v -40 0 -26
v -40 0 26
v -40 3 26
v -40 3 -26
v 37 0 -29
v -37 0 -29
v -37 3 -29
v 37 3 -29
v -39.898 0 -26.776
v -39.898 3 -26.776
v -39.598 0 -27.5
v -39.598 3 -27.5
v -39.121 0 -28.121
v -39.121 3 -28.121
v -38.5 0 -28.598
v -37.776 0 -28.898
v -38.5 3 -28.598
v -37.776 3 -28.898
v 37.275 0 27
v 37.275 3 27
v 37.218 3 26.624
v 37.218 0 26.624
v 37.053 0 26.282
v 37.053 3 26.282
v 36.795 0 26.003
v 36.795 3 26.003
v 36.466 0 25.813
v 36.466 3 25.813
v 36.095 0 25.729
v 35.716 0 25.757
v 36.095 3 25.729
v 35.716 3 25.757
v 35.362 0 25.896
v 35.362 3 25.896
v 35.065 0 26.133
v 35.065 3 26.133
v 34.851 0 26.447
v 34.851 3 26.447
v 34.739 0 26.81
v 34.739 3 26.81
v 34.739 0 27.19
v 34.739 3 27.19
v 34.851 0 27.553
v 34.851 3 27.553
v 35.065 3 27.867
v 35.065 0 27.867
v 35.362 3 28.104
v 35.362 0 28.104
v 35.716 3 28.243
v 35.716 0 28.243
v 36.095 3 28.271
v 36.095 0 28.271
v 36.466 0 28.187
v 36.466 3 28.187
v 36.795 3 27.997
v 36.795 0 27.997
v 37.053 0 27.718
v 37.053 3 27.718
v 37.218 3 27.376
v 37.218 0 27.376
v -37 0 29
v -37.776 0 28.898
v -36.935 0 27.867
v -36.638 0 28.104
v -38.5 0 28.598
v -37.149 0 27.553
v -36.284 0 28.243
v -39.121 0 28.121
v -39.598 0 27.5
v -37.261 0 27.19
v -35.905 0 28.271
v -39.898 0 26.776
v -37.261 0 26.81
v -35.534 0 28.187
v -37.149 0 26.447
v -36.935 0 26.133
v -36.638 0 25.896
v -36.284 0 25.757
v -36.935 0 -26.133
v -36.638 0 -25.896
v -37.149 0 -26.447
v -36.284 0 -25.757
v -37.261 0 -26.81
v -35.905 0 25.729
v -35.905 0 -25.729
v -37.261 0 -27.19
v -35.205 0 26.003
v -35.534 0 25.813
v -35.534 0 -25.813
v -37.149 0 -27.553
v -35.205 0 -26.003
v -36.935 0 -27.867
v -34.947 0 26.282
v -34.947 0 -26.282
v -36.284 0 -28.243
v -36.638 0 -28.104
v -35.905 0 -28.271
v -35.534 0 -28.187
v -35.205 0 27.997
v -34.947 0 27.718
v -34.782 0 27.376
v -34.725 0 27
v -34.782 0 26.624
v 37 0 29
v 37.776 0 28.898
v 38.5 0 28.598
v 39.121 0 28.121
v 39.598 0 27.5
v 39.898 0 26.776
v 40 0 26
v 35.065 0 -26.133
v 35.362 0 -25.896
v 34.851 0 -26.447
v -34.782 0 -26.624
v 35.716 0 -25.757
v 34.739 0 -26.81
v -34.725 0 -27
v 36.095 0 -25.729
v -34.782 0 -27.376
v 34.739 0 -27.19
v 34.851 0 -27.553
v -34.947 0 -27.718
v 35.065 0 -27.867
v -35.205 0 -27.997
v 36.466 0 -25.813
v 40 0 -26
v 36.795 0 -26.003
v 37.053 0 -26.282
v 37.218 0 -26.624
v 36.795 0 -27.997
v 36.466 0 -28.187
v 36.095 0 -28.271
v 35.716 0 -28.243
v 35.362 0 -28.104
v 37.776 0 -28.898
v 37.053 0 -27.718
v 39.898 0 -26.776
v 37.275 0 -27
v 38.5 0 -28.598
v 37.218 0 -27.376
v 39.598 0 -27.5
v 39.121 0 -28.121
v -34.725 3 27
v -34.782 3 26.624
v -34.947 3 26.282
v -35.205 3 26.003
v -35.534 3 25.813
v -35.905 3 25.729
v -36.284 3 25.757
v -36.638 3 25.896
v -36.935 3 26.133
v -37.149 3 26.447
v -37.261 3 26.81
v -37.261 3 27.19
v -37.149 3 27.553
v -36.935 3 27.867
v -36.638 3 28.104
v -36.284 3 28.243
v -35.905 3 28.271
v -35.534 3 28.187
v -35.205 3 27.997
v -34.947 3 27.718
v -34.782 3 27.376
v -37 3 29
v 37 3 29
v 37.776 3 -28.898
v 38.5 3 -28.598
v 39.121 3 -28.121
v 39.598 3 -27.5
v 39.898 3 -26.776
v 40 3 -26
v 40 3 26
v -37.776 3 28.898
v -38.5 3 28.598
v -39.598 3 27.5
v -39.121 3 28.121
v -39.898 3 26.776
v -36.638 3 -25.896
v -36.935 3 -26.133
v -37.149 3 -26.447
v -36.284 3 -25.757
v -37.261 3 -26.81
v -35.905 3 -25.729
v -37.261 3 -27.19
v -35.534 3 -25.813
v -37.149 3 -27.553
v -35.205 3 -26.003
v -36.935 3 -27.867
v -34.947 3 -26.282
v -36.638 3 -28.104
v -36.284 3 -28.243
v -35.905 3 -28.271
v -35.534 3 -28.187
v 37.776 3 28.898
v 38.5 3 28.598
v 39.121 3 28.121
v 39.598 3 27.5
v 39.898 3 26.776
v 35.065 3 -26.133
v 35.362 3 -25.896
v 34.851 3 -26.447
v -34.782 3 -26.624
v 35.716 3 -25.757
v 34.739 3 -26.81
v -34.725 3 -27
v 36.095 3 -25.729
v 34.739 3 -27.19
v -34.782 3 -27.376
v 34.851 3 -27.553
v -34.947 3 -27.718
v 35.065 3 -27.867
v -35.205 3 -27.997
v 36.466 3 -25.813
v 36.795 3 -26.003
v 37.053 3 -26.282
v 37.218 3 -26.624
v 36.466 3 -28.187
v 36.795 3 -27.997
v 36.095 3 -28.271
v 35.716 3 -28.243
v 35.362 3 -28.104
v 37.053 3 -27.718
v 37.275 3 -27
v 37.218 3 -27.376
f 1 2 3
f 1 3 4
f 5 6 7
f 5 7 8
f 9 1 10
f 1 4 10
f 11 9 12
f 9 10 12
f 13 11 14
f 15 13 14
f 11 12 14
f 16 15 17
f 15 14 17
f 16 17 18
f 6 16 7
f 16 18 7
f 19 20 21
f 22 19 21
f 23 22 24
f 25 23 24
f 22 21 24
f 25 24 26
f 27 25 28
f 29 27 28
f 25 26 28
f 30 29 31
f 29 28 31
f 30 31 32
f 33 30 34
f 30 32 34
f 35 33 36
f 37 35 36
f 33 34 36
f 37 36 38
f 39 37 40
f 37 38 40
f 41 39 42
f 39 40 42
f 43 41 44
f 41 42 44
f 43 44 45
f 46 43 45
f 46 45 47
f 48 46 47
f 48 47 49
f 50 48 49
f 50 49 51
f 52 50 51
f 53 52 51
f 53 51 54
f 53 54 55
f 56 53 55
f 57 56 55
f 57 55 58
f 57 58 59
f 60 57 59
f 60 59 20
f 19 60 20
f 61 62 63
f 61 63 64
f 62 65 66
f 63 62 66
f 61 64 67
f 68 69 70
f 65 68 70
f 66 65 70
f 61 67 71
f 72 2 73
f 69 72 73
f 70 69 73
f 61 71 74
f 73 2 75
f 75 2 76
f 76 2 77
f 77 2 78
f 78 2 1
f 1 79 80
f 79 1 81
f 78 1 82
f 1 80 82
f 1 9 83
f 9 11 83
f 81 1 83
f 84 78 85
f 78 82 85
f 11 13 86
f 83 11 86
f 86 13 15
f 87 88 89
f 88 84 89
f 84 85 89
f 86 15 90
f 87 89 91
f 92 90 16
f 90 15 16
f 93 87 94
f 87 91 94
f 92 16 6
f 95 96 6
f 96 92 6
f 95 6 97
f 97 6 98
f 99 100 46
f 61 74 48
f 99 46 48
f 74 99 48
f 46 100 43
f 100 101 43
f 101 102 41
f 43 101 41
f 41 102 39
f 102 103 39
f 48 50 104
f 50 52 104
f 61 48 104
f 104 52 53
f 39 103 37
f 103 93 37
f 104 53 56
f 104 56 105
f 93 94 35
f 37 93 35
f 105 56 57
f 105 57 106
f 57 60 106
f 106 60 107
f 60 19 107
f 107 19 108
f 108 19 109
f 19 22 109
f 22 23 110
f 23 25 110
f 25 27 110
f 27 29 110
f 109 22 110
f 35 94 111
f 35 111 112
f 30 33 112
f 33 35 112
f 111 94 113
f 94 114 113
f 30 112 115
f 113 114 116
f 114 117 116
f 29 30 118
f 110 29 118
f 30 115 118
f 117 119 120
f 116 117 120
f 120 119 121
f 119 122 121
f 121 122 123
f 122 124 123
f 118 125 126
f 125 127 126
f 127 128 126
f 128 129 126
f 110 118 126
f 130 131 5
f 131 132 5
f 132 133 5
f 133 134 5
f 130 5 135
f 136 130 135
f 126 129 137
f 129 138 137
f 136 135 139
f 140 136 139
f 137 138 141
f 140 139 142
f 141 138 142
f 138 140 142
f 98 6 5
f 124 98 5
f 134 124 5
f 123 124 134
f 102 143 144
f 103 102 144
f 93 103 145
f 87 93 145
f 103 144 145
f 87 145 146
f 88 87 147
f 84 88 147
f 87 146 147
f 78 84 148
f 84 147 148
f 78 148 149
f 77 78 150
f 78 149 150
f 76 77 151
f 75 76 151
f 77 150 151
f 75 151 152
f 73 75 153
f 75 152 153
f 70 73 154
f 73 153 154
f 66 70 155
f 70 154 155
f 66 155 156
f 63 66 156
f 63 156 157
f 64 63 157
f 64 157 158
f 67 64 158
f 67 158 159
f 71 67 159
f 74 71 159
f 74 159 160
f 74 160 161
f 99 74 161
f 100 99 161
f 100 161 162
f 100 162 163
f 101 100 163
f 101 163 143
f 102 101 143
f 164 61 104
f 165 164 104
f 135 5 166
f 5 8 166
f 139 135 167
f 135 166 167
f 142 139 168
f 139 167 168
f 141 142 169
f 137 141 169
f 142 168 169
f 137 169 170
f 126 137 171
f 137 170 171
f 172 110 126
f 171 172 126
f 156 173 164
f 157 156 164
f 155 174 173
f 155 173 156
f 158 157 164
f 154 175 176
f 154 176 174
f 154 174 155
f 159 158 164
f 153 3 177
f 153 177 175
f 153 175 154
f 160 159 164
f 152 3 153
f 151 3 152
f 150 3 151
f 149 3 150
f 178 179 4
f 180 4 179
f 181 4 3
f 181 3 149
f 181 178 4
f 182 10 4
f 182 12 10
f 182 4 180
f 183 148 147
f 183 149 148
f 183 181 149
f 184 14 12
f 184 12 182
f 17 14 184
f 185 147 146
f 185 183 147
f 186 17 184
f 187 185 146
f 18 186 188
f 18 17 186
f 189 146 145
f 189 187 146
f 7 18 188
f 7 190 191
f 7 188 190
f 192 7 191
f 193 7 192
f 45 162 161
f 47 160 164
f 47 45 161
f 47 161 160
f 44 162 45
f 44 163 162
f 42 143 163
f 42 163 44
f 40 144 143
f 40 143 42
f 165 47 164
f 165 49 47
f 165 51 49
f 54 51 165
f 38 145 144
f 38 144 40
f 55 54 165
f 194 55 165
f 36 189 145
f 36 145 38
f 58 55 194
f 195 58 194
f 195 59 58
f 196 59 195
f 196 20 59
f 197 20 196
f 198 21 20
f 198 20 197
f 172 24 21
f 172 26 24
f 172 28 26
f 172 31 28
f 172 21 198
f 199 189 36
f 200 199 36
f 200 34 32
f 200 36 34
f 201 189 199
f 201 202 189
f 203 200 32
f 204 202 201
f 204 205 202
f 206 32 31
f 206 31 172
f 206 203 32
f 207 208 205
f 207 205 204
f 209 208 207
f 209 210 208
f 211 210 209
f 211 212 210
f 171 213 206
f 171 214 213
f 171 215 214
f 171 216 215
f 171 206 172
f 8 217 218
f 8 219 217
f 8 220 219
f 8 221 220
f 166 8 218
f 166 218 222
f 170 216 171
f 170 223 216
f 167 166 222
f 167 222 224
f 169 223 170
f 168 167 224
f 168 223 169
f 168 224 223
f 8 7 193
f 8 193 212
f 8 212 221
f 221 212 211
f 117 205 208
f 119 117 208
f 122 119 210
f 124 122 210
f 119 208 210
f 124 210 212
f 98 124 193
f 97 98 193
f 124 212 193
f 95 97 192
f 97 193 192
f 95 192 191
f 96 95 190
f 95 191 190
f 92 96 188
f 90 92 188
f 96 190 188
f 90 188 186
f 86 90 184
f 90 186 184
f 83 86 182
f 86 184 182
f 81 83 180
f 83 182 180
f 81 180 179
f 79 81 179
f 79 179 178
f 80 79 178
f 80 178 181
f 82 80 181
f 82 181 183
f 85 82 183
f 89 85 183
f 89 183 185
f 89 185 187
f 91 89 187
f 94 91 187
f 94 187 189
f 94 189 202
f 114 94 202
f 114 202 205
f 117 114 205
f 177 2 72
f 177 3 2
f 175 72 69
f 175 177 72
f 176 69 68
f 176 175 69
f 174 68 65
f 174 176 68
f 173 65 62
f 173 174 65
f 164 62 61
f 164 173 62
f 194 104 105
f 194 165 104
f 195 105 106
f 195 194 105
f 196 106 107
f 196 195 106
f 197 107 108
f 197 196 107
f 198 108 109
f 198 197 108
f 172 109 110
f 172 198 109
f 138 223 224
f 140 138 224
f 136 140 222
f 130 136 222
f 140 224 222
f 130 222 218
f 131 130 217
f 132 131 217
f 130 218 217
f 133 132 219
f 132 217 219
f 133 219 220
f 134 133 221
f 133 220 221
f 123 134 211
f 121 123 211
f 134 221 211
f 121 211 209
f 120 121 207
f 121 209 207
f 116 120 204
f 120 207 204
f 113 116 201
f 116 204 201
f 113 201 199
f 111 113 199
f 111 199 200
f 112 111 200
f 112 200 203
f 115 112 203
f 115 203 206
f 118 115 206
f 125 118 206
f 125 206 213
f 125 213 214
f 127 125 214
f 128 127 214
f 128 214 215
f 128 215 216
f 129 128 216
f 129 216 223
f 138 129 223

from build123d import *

# Parameters (mm, degrees)
SKETCH_1_W               = 80
SKETCH_1_H               = 58
EXTRUDE_1_DEPTH          = 3
SKETCH_2_R               = 1.275
CUT_EXTRUDE_1_DEPTH      = 1
CUT_EXTRUDE_1_DEPTH_BACK = 4
FILLET_1_R               = 3


with BuildPart() as part:
    # 草图1 → 凸台-拉伸1 (new body)
    with BuildSketch(Plane(origin=(0, 0, 0), x_dir=(1, 0, 0), z_dir=(0, 1, 0))):
        Rectangle(SKETCH_1_W, SKETCH_1_H)
    extrude(amount=EXTRUDE_1_DEPTH)

    # 草图2 → 切除-拉伸1 (cut, two sides)
    with BuildSketch(Plane(origin=(0, 3, 0), x_dir=(1, 0, 0), z_dir=(0, 1, 0))) as cut_extrude_1_sk:
        with Locations((36, -27)):
            Circle(SKETCH_2_R)
        with Locations((36, 27)):
            Circle(SKETCH_2_R)
        with Locations((-36, 27)):
            Circle(SKETCH_2_R)
        with Locations((-36, -27)):
            Circle(SKETCH_2_R)
    extrude(amount=CUT_EXTRUDE_1_DEPTH, mode=Mode.SUBTRACT)
    extrude(cut_extrude_1_sk.sketch, amount=-CUT_EXTRUDE_1_DEPTH_BACK, mode=Mode.SUBTRACT)

    # 圆角1
    fillet_1_edges = [part.edges().sort_by_distance(p)[0] for p in [
        (40, 1.5, 29),
        (-40, 1.5, 29),
        (-40, 1.5, -29),
        (40, 1.5, -29),
    ]]
    fillet(fillet_1_edges, radius=FILLET_1_R)


solid = part.part
